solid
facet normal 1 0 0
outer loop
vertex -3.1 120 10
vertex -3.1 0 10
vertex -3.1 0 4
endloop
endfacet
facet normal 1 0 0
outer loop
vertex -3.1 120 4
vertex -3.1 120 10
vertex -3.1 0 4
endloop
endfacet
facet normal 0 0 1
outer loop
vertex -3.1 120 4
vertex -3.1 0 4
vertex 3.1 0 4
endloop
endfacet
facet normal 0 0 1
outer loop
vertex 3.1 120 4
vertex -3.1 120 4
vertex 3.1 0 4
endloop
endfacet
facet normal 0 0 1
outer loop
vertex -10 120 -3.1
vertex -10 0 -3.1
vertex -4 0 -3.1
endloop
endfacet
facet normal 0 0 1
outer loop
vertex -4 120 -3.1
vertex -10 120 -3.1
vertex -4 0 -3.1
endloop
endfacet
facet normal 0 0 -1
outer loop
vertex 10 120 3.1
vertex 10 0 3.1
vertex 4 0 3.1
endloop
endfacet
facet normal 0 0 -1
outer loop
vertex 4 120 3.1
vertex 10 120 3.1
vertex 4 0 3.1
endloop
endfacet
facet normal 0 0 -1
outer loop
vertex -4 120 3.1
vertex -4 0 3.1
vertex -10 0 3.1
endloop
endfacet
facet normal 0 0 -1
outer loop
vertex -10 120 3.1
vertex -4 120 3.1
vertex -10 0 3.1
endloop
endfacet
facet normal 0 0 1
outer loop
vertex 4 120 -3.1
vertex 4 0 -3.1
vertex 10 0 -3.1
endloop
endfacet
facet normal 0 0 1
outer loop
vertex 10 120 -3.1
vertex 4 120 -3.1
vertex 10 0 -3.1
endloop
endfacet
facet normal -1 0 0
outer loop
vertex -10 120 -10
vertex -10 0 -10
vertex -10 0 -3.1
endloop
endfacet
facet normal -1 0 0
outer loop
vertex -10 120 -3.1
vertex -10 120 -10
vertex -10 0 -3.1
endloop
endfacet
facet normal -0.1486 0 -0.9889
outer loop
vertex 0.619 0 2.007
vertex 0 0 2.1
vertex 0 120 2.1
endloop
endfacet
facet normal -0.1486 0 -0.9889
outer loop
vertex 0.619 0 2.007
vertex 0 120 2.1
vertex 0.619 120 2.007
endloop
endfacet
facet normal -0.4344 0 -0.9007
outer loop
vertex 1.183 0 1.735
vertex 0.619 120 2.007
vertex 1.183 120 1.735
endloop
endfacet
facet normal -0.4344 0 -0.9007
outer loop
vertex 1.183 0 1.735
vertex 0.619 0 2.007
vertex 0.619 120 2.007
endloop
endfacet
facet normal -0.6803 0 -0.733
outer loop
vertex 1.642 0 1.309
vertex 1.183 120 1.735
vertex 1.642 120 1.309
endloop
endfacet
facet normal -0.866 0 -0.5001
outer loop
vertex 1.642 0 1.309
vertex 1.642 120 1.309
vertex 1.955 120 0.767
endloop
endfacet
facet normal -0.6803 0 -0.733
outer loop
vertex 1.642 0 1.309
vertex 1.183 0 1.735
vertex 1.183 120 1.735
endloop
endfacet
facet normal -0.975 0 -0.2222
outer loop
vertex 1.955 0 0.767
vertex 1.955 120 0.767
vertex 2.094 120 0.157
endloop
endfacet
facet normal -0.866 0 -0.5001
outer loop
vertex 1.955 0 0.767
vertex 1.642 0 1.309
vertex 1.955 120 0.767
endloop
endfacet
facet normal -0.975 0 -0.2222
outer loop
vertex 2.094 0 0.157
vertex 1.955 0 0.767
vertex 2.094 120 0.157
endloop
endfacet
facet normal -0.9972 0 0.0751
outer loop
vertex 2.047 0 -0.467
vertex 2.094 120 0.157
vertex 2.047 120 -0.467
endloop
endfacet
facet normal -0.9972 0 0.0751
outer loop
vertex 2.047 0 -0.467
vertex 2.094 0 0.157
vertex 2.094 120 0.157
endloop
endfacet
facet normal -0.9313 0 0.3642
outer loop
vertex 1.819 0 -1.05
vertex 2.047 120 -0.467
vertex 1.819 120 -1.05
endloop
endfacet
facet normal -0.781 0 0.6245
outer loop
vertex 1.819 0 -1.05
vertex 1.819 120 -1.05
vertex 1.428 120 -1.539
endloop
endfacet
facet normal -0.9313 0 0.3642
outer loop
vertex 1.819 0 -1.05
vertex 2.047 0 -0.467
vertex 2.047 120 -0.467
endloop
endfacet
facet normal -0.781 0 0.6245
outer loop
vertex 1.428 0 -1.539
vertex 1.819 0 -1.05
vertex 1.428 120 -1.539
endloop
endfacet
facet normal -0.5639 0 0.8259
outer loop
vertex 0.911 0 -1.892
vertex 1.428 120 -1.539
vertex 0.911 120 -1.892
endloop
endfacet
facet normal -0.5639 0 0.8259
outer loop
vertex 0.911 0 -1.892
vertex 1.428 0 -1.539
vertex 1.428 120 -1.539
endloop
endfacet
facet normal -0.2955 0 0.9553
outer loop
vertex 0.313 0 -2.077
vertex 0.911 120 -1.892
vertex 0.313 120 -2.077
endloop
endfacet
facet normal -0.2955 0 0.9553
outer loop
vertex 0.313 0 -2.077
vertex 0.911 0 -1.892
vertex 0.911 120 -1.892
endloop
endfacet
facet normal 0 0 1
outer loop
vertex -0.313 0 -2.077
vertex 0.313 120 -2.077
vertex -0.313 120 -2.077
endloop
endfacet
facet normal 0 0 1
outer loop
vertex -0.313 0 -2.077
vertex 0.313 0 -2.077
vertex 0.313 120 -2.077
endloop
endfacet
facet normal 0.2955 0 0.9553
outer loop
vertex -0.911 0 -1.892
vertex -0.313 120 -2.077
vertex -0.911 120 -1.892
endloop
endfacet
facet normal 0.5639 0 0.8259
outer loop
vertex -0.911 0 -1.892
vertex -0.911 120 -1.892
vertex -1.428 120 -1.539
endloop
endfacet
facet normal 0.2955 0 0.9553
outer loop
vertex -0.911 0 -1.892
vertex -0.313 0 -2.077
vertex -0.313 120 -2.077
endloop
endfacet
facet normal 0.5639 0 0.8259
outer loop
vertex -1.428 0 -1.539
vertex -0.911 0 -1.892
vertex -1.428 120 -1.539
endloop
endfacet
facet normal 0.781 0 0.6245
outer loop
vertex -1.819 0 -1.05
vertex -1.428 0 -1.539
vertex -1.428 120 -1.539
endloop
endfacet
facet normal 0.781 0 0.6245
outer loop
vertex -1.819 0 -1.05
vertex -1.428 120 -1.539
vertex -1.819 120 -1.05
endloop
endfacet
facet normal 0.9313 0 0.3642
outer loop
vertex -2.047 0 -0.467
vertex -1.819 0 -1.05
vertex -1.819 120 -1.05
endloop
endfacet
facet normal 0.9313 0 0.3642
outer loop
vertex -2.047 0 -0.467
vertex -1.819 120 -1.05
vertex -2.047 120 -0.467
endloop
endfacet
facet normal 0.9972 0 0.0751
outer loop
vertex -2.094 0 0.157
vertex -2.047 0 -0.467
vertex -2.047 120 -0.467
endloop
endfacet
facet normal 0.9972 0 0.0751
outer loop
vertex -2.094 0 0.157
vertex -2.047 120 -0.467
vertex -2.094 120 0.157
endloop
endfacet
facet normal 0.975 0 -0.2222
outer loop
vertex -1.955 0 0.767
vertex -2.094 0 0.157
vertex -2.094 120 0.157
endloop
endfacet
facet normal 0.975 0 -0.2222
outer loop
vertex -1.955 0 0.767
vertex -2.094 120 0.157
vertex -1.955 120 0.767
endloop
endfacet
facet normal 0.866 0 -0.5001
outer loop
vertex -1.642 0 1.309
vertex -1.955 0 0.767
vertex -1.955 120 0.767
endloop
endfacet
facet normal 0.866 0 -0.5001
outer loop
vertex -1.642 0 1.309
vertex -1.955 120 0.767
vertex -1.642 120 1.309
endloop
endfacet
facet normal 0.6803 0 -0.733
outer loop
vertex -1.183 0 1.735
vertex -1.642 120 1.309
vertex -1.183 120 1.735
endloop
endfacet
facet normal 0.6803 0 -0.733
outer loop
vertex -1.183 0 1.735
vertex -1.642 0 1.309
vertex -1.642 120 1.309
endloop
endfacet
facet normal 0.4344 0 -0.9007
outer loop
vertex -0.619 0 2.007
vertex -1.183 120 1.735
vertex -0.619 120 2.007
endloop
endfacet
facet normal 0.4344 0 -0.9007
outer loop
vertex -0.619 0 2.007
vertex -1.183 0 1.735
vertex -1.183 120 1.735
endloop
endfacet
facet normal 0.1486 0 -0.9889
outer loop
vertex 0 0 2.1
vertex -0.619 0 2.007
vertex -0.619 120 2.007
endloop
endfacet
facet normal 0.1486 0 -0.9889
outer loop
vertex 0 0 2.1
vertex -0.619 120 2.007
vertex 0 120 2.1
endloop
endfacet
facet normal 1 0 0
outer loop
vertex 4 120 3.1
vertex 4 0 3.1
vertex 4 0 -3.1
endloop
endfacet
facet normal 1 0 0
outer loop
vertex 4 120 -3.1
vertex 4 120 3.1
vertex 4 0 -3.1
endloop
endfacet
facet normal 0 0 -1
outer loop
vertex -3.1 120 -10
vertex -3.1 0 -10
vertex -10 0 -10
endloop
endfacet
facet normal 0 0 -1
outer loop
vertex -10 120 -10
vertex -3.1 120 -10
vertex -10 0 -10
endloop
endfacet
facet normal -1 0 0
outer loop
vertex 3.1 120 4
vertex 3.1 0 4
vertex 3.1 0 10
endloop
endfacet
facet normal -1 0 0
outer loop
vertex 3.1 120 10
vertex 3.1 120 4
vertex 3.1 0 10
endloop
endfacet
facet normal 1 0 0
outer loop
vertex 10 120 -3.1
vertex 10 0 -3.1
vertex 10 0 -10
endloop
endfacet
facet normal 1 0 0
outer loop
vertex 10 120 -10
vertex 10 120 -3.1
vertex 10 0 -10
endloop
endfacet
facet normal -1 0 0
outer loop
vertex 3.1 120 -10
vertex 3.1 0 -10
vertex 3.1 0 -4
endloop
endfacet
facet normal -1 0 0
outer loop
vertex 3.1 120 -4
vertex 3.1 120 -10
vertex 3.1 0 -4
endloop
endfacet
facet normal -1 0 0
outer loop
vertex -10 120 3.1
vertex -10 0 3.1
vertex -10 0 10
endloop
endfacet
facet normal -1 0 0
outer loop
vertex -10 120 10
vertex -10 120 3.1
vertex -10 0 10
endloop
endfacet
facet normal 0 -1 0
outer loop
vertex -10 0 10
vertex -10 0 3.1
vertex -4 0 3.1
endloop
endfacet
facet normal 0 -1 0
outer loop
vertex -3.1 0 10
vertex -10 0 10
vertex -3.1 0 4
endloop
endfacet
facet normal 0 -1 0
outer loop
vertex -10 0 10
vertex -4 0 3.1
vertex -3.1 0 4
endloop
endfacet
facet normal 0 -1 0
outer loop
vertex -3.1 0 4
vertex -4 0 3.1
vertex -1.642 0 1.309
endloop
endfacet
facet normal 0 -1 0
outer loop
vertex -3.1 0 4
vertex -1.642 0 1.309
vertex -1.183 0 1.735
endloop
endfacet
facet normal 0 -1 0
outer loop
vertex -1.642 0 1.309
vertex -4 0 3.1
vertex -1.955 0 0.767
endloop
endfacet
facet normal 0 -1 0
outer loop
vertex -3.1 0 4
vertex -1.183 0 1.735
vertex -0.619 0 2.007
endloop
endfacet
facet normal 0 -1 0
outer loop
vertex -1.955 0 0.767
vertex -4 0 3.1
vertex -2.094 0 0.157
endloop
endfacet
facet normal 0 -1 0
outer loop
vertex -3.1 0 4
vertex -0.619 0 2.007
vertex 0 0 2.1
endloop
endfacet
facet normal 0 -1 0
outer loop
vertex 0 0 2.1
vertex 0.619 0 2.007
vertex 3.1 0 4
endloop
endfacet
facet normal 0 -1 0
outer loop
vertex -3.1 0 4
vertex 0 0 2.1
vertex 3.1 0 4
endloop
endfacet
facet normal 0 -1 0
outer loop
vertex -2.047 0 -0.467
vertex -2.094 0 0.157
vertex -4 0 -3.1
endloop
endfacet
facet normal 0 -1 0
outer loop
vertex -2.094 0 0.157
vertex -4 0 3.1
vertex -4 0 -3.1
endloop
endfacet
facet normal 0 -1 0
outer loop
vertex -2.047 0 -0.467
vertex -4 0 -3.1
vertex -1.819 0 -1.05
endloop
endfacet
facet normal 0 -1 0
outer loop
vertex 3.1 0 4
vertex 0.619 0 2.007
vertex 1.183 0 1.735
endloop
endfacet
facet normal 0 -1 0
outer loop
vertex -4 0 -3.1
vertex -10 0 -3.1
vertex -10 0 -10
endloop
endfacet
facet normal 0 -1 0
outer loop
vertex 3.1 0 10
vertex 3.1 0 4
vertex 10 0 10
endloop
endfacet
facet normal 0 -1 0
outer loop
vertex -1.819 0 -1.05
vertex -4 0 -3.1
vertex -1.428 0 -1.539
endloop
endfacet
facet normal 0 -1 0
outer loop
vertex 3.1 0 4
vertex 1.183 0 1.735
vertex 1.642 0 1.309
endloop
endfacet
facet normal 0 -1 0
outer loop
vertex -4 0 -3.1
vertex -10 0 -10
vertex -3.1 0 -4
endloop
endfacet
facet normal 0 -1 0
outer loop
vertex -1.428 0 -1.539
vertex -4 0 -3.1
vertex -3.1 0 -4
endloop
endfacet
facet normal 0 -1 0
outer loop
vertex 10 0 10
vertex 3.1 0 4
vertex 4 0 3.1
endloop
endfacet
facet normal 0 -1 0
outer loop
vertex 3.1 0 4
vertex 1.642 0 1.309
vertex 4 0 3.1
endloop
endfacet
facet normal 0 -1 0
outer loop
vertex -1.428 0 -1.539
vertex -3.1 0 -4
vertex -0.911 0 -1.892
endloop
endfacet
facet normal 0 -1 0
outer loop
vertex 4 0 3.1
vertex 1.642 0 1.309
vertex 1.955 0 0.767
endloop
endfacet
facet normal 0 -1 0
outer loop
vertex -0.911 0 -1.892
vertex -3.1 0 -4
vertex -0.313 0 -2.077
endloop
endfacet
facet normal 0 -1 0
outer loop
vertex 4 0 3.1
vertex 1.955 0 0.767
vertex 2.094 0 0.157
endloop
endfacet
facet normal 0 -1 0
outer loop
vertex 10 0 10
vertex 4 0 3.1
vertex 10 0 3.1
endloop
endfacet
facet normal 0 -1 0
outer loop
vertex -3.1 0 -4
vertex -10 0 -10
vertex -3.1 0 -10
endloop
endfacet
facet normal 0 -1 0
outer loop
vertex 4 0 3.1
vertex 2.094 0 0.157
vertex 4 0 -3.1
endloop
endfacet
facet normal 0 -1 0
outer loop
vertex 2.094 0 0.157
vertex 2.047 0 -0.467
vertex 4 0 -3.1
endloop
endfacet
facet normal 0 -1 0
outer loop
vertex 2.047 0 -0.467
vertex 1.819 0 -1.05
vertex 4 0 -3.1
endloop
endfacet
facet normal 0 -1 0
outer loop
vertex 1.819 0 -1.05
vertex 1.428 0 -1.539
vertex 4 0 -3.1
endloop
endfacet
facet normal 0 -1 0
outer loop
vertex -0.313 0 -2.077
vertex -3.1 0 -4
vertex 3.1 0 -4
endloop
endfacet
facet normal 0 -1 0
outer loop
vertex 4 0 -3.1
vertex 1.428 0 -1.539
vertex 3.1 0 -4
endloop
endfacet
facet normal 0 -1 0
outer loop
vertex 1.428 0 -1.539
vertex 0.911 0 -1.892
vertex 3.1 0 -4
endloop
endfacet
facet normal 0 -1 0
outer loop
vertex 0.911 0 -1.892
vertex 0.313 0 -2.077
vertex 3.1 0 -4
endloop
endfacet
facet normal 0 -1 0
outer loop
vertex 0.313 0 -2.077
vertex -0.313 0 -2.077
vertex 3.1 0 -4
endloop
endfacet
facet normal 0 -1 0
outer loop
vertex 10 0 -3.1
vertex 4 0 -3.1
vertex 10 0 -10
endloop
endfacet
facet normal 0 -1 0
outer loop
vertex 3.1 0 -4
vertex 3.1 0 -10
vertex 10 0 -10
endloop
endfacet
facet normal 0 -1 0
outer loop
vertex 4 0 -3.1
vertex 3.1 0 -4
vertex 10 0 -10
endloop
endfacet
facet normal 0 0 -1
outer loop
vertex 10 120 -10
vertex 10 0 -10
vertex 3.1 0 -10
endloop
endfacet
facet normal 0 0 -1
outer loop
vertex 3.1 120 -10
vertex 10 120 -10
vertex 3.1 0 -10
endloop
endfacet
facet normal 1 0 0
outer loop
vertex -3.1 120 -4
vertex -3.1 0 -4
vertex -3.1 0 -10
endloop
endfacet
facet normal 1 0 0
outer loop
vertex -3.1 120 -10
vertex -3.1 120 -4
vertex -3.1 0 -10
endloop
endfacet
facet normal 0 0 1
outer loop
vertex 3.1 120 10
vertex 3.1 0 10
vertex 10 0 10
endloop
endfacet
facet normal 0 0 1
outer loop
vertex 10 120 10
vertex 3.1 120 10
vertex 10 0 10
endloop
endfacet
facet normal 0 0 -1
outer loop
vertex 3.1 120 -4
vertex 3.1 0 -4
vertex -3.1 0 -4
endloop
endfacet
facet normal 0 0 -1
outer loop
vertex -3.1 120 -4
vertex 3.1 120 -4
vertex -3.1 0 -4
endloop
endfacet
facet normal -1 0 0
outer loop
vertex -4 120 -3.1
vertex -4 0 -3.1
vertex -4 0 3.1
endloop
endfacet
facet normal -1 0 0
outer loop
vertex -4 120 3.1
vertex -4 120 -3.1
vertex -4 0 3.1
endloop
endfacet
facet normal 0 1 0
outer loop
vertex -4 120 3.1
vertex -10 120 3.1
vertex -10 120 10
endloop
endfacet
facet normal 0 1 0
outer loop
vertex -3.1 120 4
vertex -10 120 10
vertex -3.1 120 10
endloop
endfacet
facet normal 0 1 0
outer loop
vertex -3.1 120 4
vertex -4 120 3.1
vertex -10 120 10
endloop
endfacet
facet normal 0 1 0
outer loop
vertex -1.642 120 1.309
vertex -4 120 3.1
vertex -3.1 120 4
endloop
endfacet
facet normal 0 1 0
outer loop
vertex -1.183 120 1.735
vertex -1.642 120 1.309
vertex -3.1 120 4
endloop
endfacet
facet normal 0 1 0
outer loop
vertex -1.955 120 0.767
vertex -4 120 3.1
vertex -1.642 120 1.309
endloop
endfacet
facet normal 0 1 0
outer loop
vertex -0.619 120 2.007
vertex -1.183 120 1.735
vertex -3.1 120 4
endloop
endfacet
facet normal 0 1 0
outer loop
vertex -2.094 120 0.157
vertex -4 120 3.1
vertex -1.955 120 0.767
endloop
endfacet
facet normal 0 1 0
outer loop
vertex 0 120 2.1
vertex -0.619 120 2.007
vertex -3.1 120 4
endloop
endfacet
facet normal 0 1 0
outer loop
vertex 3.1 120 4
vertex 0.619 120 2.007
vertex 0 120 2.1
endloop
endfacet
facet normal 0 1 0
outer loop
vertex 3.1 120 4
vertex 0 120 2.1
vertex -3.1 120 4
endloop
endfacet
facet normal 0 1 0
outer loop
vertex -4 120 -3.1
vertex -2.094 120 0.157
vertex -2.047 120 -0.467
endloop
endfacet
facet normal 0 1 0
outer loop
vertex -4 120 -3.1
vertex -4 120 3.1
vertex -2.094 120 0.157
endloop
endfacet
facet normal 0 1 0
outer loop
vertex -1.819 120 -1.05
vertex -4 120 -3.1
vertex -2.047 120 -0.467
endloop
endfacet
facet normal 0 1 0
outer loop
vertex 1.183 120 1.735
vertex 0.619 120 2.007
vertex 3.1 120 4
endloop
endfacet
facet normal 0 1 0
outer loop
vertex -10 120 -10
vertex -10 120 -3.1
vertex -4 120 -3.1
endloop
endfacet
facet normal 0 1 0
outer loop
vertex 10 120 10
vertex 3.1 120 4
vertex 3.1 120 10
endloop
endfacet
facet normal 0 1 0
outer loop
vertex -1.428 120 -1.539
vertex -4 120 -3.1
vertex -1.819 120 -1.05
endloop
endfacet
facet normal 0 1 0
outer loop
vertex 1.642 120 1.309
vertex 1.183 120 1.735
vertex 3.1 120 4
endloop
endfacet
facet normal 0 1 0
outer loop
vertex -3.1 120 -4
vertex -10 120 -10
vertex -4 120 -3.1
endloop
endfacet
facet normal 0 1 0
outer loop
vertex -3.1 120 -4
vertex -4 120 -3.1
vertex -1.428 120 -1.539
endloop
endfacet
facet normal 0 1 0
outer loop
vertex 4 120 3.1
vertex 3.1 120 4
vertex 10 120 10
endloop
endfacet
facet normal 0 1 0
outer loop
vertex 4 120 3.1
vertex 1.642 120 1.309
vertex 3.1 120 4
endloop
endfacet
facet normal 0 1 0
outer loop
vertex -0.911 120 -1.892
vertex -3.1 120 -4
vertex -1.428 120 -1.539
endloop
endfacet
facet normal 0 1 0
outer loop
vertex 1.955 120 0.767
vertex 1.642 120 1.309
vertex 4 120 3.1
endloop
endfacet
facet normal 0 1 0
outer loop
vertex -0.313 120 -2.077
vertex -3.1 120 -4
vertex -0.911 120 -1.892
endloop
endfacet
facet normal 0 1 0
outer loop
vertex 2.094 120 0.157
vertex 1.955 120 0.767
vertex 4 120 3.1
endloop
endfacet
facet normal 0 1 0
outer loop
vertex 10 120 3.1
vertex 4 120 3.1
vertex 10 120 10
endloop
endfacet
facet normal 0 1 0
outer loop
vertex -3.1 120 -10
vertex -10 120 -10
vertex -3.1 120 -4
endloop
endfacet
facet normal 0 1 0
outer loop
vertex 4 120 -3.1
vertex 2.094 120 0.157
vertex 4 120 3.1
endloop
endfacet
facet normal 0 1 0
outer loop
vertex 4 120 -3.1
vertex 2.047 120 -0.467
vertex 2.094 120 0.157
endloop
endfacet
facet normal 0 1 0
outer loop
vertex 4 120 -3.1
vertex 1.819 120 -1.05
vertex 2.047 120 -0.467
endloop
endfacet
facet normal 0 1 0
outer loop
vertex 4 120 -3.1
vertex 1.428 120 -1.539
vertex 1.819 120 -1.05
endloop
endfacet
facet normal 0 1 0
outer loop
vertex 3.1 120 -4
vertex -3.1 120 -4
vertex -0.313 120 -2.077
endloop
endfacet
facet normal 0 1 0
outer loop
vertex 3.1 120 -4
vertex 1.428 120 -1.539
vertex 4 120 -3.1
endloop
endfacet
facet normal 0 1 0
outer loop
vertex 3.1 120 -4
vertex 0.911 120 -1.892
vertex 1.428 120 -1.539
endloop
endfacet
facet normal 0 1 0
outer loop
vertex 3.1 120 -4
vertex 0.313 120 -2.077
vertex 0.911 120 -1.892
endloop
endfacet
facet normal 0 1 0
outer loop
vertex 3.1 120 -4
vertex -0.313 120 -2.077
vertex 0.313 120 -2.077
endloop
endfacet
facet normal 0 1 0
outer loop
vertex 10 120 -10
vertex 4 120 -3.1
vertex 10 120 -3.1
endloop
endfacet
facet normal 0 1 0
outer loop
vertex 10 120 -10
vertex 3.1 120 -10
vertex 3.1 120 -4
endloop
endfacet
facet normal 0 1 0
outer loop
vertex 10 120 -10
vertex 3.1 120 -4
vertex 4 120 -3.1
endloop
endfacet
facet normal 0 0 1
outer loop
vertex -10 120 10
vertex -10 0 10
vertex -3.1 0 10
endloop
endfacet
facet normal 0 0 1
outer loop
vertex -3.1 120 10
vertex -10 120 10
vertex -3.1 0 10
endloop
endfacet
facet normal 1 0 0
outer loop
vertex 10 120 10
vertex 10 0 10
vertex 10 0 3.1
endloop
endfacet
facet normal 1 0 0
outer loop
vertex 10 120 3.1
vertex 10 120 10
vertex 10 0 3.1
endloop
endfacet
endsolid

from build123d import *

# Parameters (mm, degrees)
SK_P01_P2020_R  = 2.1
P01_P2020_DEPTH = 120


with BuildPart() as part:
    # SK_P01_p2020 → P01_p2020 (new body)
    with BuildSketch(Plane(origin=(0, 0, 0), x_dir=(1, 0, 0), z_dir=(0, 1, 0))):
        Polygon((10, -10), (10, -3.1), (4, -3.1), (4, 3.1), (10, 3.1), (10, 10), (3.1, 10), (3.1, 4), (-3.1, 4), (-3.1, 10), (-10, 10), (-10, 3.1), (-4, 3.1), (-4, -3.1), (-10, -3.1), (-10, -10), (-3.1, -10), (-3.1, -4), (3.1, -4), (3.1, -10), align=None)
        with Locations(Location((0, 0, 0), (0, 0, 270))):
            Circle(SK_P01_P2020_R, mode=Mode.SUBTRACT)
    extrude(amount=P01_P2020_DEPTH)


solid = part.part
